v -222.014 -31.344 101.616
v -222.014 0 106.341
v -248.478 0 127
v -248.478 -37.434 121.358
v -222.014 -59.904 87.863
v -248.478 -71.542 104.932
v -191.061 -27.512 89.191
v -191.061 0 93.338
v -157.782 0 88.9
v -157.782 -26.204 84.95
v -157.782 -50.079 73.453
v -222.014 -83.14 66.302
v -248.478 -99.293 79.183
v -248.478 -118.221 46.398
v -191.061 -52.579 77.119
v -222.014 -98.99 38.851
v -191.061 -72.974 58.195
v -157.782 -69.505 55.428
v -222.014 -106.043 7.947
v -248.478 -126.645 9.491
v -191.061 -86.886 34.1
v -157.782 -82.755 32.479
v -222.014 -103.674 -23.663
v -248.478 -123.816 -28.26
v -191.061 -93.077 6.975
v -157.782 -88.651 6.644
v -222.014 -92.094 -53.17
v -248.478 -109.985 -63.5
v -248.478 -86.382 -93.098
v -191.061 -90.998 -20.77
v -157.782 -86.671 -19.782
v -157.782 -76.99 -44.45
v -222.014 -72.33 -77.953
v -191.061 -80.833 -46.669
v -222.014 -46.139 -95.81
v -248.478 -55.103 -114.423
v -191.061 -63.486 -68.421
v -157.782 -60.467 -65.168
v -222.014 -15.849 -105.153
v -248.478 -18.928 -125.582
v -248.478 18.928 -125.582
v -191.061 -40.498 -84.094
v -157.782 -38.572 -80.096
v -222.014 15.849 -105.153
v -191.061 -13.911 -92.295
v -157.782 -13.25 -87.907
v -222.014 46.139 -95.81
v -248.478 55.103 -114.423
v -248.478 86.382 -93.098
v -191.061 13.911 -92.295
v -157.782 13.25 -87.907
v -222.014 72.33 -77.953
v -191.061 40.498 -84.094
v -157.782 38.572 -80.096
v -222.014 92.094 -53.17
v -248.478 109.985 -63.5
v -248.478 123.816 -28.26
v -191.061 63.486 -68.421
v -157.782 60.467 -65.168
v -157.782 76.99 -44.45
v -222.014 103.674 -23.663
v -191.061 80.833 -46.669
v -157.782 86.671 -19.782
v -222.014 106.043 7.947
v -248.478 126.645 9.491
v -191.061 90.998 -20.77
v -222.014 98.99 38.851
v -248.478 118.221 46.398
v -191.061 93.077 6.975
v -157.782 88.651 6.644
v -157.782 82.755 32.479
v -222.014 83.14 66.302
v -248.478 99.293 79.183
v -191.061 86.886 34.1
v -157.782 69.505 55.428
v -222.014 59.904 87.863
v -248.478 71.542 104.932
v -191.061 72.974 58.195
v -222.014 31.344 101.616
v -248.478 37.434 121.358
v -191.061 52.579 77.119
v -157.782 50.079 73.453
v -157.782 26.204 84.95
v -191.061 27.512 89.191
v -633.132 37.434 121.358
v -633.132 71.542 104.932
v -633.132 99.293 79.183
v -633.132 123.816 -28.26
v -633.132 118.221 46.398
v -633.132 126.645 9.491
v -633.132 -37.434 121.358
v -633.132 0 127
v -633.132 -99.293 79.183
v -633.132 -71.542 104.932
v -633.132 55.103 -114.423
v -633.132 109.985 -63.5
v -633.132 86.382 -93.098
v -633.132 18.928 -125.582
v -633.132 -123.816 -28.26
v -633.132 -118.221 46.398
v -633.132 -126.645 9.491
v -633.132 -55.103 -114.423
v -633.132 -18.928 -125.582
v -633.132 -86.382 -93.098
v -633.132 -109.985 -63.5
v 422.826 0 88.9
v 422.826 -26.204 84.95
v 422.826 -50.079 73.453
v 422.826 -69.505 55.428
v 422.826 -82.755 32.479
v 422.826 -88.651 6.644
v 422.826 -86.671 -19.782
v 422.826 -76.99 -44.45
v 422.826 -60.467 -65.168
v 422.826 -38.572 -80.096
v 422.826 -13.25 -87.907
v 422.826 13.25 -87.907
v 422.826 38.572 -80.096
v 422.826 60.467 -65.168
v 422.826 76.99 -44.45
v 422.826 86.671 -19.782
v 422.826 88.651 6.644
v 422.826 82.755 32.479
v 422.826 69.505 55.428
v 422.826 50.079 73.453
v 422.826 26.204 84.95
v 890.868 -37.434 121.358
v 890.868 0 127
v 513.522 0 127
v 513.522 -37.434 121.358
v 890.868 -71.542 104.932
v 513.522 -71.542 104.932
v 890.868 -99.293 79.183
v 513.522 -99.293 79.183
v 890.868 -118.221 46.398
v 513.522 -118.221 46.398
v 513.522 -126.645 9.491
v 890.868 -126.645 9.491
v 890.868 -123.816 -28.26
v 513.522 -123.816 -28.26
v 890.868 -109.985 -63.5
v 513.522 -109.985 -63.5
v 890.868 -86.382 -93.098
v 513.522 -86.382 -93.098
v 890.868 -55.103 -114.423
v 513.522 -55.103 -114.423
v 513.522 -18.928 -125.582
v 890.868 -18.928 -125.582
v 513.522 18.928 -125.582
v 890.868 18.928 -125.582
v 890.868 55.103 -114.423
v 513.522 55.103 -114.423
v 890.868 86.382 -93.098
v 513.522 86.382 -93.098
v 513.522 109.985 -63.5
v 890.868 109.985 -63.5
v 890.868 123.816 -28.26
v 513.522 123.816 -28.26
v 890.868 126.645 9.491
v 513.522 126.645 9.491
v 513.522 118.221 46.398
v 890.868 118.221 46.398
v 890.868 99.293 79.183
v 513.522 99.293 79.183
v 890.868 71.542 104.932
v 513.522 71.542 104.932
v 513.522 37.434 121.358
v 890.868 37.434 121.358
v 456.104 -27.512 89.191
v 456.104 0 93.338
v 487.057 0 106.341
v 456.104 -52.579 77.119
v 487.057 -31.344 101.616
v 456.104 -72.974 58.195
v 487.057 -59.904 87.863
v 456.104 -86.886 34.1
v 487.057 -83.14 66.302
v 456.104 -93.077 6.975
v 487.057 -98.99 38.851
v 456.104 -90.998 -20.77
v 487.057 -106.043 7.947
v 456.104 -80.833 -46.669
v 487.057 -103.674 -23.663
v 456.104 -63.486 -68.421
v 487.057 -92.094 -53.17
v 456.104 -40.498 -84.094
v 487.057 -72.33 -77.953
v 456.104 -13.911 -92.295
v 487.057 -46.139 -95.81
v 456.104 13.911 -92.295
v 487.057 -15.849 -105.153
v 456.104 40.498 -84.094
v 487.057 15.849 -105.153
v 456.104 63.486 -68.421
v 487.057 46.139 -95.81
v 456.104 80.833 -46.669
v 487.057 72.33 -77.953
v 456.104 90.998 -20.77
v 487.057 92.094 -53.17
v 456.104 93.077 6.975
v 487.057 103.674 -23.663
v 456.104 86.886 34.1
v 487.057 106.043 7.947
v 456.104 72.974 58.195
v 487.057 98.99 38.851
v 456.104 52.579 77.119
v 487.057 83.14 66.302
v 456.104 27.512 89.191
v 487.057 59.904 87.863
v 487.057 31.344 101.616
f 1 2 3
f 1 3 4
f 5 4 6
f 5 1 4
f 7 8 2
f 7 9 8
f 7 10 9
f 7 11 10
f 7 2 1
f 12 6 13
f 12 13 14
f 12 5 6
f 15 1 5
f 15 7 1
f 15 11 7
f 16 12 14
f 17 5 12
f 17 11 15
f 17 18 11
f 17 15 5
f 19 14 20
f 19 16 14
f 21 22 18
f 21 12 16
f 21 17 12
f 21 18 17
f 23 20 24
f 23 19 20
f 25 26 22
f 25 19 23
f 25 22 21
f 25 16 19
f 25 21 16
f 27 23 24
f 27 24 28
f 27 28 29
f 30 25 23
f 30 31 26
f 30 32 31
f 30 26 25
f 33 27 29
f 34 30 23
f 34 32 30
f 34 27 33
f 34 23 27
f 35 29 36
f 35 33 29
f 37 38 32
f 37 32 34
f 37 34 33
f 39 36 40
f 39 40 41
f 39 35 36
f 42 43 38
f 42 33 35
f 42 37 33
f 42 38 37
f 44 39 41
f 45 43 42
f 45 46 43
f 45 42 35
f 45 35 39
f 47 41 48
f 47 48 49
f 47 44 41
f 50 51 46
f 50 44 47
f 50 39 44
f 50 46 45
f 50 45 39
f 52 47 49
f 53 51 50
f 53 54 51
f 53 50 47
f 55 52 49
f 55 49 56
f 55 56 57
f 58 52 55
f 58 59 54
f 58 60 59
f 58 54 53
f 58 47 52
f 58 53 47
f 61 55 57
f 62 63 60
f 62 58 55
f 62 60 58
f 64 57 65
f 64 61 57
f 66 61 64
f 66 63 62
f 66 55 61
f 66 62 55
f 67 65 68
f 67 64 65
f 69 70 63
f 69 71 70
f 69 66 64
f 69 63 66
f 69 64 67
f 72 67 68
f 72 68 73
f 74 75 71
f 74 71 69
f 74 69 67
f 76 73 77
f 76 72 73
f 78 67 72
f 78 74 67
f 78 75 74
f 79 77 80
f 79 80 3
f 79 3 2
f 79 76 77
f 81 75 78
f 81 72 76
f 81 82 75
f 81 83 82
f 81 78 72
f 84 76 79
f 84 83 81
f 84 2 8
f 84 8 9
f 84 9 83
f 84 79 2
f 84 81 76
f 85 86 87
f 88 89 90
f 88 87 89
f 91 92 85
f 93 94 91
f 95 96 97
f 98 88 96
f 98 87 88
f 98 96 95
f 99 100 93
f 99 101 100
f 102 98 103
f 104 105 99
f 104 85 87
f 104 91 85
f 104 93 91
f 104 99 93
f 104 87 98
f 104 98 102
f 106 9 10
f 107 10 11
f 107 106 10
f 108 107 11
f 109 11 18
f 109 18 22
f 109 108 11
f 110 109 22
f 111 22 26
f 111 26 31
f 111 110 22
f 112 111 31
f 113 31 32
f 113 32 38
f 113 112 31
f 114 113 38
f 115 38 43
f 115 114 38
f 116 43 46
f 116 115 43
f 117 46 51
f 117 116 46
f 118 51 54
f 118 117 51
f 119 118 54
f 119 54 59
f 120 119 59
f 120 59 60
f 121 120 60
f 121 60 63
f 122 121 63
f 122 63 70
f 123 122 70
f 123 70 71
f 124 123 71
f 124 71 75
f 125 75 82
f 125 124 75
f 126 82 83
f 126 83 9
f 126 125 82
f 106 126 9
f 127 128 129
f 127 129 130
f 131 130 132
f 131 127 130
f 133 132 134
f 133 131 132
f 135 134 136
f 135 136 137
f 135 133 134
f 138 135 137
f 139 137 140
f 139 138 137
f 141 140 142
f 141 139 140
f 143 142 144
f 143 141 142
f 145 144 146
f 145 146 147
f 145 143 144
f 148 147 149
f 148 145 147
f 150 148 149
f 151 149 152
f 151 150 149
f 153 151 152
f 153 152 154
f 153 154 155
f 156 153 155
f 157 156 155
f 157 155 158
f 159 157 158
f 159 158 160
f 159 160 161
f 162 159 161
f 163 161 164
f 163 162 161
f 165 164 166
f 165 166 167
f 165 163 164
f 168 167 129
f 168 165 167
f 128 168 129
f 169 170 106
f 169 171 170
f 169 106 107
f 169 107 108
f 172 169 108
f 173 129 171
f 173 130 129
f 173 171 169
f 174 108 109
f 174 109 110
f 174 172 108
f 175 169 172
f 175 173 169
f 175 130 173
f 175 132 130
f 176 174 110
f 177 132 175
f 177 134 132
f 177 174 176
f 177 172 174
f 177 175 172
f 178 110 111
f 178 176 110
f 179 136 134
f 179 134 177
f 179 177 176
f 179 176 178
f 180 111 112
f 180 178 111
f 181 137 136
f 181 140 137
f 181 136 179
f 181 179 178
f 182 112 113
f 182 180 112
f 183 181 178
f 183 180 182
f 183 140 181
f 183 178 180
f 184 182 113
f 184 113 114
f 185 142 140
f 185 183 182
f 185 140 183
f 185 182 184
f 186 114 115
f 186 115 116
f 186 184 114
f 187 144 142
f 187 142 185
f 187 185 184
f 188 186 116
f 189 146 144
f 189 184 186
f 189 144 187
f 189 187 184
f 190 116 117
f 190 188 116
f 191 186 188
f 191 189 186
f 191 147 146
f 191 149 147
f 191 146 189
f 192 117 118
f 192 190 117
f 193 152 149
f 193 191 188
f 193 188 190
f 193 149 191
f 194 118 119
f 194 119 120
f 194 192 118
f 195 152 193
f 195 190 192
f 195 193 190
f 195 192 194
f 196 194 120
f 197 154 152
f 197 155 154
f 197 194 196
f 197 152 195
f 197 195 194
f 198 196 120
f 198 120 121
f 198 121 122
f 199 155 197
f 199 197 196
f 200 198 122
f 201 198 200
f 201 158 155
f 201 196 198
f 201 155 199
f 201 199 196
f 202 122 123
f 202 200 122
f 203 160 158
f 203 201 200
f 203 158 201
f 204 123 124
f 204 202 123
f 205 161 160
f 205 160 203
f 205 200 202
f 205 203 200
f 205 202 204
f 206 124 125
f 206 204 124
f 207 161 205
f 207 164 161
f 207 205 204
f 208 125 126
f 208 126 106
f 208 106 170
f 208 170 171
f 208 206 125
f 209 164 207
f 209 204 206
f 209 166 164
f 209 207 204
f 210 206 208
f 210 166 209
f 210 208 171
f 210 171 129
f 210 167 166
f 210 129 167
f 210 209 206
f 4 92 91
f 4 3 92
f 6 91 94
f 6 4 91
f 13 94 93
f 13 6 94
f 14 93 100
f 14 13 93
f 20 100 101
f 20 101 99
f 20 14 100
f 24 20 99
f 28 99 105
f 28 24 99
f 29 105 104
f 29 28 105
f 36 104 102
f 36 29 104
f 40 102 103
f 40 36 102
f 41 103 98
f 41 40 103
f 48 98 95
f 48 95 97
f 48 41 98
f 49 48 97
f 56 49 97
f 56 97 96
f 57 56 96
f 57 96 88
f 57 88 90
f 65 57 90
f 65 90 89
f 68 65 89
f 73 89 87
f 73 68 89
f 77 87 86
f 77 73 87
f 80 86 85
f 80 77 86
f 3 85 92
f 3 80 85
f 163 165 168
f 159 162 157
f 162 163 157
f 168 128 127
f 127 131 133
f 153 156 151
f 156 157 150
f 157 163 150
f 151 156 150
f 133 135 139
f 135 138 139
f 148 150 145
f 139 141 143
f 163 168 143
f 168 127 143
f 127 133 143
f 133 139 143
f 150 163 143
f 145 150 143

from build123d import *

# Parameters (mm, degrees)
F0_W = 1524
F0_H = 127
F2_W = 762
F2_H = 305.5362462927


# Not quite as in the source:
# - a fillet or chamfer that OpenCascade refuses, or shapes differently, is made with other operations: its cross-section is extruded or revolved along the edge and cut away or added


with BuildPart() as f1:
    # F0 (on Front) → F1 (revolve)
    with BuildSketch(Plane.XZ):
        with Locations((128.8676711868, 63.5)):
            Rectangle(F0_W, F0_H)
    revolve(axis=Axis((128.8676711868, 0, 0), (1, 0, 0)))

    # F2 (on Front) → F3 (revolve, cut)
    with BuildSketch(Plane.XZ):
        with Locations((132.5217391304, 241.6681231464)):
            Rectangle(F2_W, F2_H)
    revolve(axis=Axis((22.0869673282, 0, 0), (1, 0, 0)), mode=Mode.SUBTRACT)

    # F4: fillet of radius 127 on 1 edges, made by hand

    # F4_s1 → F4_t2 (revolve)
    with BuildSketch(Plane.XZ):
        with BuildLine():
            ThreePointArc((-248.4782608696, 127), (-206.9690083239, 98.8117853924), (-157.7821198271, 88.9))
            Line((-157.7821198271, 88.9), (-248.4782608696, 88.9))
            Line((-248.4782608696, 88.9), (-248.4782608696, 127))
        make_face()
    revolve(axis=Axis((-248.4782608696, 0, 0), (1, 0, 0)))

    # F5: fillet of radius 127 on 1 edges, made by hand

    # F5_s1 → F5_t2 (revolve)
    with BuildSketch(Plane.XZ):
        with BuildLine():
            ThreePointArc((422.8255980879, 88.9), (472.0124865848, 98.8117853924), (513.5217391304, 127))
            Line((513.5217391304, 127), (513.5217391304, 88.9))
            Line((513.5217391304, 88.9), (422.8255980879, 88.9))
        make_face()
    revolve(axis=Axis((513.5217391304, 0, 0), (1, 0, 0)))


solid = f1.part
